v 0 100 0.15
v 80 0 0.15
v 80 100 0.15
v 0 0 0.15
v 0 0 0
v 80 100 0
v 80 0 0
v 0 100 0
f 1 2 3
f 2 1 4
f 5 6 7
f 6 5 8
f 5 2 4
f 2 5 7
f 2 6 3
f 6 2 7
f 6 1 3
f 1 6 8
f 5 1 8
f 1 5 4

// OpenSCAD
// Create the stencil (only for the sake of checking the assembly)

module stencil() {
    cube([80, 100, 0.15]);
}

stencil();
